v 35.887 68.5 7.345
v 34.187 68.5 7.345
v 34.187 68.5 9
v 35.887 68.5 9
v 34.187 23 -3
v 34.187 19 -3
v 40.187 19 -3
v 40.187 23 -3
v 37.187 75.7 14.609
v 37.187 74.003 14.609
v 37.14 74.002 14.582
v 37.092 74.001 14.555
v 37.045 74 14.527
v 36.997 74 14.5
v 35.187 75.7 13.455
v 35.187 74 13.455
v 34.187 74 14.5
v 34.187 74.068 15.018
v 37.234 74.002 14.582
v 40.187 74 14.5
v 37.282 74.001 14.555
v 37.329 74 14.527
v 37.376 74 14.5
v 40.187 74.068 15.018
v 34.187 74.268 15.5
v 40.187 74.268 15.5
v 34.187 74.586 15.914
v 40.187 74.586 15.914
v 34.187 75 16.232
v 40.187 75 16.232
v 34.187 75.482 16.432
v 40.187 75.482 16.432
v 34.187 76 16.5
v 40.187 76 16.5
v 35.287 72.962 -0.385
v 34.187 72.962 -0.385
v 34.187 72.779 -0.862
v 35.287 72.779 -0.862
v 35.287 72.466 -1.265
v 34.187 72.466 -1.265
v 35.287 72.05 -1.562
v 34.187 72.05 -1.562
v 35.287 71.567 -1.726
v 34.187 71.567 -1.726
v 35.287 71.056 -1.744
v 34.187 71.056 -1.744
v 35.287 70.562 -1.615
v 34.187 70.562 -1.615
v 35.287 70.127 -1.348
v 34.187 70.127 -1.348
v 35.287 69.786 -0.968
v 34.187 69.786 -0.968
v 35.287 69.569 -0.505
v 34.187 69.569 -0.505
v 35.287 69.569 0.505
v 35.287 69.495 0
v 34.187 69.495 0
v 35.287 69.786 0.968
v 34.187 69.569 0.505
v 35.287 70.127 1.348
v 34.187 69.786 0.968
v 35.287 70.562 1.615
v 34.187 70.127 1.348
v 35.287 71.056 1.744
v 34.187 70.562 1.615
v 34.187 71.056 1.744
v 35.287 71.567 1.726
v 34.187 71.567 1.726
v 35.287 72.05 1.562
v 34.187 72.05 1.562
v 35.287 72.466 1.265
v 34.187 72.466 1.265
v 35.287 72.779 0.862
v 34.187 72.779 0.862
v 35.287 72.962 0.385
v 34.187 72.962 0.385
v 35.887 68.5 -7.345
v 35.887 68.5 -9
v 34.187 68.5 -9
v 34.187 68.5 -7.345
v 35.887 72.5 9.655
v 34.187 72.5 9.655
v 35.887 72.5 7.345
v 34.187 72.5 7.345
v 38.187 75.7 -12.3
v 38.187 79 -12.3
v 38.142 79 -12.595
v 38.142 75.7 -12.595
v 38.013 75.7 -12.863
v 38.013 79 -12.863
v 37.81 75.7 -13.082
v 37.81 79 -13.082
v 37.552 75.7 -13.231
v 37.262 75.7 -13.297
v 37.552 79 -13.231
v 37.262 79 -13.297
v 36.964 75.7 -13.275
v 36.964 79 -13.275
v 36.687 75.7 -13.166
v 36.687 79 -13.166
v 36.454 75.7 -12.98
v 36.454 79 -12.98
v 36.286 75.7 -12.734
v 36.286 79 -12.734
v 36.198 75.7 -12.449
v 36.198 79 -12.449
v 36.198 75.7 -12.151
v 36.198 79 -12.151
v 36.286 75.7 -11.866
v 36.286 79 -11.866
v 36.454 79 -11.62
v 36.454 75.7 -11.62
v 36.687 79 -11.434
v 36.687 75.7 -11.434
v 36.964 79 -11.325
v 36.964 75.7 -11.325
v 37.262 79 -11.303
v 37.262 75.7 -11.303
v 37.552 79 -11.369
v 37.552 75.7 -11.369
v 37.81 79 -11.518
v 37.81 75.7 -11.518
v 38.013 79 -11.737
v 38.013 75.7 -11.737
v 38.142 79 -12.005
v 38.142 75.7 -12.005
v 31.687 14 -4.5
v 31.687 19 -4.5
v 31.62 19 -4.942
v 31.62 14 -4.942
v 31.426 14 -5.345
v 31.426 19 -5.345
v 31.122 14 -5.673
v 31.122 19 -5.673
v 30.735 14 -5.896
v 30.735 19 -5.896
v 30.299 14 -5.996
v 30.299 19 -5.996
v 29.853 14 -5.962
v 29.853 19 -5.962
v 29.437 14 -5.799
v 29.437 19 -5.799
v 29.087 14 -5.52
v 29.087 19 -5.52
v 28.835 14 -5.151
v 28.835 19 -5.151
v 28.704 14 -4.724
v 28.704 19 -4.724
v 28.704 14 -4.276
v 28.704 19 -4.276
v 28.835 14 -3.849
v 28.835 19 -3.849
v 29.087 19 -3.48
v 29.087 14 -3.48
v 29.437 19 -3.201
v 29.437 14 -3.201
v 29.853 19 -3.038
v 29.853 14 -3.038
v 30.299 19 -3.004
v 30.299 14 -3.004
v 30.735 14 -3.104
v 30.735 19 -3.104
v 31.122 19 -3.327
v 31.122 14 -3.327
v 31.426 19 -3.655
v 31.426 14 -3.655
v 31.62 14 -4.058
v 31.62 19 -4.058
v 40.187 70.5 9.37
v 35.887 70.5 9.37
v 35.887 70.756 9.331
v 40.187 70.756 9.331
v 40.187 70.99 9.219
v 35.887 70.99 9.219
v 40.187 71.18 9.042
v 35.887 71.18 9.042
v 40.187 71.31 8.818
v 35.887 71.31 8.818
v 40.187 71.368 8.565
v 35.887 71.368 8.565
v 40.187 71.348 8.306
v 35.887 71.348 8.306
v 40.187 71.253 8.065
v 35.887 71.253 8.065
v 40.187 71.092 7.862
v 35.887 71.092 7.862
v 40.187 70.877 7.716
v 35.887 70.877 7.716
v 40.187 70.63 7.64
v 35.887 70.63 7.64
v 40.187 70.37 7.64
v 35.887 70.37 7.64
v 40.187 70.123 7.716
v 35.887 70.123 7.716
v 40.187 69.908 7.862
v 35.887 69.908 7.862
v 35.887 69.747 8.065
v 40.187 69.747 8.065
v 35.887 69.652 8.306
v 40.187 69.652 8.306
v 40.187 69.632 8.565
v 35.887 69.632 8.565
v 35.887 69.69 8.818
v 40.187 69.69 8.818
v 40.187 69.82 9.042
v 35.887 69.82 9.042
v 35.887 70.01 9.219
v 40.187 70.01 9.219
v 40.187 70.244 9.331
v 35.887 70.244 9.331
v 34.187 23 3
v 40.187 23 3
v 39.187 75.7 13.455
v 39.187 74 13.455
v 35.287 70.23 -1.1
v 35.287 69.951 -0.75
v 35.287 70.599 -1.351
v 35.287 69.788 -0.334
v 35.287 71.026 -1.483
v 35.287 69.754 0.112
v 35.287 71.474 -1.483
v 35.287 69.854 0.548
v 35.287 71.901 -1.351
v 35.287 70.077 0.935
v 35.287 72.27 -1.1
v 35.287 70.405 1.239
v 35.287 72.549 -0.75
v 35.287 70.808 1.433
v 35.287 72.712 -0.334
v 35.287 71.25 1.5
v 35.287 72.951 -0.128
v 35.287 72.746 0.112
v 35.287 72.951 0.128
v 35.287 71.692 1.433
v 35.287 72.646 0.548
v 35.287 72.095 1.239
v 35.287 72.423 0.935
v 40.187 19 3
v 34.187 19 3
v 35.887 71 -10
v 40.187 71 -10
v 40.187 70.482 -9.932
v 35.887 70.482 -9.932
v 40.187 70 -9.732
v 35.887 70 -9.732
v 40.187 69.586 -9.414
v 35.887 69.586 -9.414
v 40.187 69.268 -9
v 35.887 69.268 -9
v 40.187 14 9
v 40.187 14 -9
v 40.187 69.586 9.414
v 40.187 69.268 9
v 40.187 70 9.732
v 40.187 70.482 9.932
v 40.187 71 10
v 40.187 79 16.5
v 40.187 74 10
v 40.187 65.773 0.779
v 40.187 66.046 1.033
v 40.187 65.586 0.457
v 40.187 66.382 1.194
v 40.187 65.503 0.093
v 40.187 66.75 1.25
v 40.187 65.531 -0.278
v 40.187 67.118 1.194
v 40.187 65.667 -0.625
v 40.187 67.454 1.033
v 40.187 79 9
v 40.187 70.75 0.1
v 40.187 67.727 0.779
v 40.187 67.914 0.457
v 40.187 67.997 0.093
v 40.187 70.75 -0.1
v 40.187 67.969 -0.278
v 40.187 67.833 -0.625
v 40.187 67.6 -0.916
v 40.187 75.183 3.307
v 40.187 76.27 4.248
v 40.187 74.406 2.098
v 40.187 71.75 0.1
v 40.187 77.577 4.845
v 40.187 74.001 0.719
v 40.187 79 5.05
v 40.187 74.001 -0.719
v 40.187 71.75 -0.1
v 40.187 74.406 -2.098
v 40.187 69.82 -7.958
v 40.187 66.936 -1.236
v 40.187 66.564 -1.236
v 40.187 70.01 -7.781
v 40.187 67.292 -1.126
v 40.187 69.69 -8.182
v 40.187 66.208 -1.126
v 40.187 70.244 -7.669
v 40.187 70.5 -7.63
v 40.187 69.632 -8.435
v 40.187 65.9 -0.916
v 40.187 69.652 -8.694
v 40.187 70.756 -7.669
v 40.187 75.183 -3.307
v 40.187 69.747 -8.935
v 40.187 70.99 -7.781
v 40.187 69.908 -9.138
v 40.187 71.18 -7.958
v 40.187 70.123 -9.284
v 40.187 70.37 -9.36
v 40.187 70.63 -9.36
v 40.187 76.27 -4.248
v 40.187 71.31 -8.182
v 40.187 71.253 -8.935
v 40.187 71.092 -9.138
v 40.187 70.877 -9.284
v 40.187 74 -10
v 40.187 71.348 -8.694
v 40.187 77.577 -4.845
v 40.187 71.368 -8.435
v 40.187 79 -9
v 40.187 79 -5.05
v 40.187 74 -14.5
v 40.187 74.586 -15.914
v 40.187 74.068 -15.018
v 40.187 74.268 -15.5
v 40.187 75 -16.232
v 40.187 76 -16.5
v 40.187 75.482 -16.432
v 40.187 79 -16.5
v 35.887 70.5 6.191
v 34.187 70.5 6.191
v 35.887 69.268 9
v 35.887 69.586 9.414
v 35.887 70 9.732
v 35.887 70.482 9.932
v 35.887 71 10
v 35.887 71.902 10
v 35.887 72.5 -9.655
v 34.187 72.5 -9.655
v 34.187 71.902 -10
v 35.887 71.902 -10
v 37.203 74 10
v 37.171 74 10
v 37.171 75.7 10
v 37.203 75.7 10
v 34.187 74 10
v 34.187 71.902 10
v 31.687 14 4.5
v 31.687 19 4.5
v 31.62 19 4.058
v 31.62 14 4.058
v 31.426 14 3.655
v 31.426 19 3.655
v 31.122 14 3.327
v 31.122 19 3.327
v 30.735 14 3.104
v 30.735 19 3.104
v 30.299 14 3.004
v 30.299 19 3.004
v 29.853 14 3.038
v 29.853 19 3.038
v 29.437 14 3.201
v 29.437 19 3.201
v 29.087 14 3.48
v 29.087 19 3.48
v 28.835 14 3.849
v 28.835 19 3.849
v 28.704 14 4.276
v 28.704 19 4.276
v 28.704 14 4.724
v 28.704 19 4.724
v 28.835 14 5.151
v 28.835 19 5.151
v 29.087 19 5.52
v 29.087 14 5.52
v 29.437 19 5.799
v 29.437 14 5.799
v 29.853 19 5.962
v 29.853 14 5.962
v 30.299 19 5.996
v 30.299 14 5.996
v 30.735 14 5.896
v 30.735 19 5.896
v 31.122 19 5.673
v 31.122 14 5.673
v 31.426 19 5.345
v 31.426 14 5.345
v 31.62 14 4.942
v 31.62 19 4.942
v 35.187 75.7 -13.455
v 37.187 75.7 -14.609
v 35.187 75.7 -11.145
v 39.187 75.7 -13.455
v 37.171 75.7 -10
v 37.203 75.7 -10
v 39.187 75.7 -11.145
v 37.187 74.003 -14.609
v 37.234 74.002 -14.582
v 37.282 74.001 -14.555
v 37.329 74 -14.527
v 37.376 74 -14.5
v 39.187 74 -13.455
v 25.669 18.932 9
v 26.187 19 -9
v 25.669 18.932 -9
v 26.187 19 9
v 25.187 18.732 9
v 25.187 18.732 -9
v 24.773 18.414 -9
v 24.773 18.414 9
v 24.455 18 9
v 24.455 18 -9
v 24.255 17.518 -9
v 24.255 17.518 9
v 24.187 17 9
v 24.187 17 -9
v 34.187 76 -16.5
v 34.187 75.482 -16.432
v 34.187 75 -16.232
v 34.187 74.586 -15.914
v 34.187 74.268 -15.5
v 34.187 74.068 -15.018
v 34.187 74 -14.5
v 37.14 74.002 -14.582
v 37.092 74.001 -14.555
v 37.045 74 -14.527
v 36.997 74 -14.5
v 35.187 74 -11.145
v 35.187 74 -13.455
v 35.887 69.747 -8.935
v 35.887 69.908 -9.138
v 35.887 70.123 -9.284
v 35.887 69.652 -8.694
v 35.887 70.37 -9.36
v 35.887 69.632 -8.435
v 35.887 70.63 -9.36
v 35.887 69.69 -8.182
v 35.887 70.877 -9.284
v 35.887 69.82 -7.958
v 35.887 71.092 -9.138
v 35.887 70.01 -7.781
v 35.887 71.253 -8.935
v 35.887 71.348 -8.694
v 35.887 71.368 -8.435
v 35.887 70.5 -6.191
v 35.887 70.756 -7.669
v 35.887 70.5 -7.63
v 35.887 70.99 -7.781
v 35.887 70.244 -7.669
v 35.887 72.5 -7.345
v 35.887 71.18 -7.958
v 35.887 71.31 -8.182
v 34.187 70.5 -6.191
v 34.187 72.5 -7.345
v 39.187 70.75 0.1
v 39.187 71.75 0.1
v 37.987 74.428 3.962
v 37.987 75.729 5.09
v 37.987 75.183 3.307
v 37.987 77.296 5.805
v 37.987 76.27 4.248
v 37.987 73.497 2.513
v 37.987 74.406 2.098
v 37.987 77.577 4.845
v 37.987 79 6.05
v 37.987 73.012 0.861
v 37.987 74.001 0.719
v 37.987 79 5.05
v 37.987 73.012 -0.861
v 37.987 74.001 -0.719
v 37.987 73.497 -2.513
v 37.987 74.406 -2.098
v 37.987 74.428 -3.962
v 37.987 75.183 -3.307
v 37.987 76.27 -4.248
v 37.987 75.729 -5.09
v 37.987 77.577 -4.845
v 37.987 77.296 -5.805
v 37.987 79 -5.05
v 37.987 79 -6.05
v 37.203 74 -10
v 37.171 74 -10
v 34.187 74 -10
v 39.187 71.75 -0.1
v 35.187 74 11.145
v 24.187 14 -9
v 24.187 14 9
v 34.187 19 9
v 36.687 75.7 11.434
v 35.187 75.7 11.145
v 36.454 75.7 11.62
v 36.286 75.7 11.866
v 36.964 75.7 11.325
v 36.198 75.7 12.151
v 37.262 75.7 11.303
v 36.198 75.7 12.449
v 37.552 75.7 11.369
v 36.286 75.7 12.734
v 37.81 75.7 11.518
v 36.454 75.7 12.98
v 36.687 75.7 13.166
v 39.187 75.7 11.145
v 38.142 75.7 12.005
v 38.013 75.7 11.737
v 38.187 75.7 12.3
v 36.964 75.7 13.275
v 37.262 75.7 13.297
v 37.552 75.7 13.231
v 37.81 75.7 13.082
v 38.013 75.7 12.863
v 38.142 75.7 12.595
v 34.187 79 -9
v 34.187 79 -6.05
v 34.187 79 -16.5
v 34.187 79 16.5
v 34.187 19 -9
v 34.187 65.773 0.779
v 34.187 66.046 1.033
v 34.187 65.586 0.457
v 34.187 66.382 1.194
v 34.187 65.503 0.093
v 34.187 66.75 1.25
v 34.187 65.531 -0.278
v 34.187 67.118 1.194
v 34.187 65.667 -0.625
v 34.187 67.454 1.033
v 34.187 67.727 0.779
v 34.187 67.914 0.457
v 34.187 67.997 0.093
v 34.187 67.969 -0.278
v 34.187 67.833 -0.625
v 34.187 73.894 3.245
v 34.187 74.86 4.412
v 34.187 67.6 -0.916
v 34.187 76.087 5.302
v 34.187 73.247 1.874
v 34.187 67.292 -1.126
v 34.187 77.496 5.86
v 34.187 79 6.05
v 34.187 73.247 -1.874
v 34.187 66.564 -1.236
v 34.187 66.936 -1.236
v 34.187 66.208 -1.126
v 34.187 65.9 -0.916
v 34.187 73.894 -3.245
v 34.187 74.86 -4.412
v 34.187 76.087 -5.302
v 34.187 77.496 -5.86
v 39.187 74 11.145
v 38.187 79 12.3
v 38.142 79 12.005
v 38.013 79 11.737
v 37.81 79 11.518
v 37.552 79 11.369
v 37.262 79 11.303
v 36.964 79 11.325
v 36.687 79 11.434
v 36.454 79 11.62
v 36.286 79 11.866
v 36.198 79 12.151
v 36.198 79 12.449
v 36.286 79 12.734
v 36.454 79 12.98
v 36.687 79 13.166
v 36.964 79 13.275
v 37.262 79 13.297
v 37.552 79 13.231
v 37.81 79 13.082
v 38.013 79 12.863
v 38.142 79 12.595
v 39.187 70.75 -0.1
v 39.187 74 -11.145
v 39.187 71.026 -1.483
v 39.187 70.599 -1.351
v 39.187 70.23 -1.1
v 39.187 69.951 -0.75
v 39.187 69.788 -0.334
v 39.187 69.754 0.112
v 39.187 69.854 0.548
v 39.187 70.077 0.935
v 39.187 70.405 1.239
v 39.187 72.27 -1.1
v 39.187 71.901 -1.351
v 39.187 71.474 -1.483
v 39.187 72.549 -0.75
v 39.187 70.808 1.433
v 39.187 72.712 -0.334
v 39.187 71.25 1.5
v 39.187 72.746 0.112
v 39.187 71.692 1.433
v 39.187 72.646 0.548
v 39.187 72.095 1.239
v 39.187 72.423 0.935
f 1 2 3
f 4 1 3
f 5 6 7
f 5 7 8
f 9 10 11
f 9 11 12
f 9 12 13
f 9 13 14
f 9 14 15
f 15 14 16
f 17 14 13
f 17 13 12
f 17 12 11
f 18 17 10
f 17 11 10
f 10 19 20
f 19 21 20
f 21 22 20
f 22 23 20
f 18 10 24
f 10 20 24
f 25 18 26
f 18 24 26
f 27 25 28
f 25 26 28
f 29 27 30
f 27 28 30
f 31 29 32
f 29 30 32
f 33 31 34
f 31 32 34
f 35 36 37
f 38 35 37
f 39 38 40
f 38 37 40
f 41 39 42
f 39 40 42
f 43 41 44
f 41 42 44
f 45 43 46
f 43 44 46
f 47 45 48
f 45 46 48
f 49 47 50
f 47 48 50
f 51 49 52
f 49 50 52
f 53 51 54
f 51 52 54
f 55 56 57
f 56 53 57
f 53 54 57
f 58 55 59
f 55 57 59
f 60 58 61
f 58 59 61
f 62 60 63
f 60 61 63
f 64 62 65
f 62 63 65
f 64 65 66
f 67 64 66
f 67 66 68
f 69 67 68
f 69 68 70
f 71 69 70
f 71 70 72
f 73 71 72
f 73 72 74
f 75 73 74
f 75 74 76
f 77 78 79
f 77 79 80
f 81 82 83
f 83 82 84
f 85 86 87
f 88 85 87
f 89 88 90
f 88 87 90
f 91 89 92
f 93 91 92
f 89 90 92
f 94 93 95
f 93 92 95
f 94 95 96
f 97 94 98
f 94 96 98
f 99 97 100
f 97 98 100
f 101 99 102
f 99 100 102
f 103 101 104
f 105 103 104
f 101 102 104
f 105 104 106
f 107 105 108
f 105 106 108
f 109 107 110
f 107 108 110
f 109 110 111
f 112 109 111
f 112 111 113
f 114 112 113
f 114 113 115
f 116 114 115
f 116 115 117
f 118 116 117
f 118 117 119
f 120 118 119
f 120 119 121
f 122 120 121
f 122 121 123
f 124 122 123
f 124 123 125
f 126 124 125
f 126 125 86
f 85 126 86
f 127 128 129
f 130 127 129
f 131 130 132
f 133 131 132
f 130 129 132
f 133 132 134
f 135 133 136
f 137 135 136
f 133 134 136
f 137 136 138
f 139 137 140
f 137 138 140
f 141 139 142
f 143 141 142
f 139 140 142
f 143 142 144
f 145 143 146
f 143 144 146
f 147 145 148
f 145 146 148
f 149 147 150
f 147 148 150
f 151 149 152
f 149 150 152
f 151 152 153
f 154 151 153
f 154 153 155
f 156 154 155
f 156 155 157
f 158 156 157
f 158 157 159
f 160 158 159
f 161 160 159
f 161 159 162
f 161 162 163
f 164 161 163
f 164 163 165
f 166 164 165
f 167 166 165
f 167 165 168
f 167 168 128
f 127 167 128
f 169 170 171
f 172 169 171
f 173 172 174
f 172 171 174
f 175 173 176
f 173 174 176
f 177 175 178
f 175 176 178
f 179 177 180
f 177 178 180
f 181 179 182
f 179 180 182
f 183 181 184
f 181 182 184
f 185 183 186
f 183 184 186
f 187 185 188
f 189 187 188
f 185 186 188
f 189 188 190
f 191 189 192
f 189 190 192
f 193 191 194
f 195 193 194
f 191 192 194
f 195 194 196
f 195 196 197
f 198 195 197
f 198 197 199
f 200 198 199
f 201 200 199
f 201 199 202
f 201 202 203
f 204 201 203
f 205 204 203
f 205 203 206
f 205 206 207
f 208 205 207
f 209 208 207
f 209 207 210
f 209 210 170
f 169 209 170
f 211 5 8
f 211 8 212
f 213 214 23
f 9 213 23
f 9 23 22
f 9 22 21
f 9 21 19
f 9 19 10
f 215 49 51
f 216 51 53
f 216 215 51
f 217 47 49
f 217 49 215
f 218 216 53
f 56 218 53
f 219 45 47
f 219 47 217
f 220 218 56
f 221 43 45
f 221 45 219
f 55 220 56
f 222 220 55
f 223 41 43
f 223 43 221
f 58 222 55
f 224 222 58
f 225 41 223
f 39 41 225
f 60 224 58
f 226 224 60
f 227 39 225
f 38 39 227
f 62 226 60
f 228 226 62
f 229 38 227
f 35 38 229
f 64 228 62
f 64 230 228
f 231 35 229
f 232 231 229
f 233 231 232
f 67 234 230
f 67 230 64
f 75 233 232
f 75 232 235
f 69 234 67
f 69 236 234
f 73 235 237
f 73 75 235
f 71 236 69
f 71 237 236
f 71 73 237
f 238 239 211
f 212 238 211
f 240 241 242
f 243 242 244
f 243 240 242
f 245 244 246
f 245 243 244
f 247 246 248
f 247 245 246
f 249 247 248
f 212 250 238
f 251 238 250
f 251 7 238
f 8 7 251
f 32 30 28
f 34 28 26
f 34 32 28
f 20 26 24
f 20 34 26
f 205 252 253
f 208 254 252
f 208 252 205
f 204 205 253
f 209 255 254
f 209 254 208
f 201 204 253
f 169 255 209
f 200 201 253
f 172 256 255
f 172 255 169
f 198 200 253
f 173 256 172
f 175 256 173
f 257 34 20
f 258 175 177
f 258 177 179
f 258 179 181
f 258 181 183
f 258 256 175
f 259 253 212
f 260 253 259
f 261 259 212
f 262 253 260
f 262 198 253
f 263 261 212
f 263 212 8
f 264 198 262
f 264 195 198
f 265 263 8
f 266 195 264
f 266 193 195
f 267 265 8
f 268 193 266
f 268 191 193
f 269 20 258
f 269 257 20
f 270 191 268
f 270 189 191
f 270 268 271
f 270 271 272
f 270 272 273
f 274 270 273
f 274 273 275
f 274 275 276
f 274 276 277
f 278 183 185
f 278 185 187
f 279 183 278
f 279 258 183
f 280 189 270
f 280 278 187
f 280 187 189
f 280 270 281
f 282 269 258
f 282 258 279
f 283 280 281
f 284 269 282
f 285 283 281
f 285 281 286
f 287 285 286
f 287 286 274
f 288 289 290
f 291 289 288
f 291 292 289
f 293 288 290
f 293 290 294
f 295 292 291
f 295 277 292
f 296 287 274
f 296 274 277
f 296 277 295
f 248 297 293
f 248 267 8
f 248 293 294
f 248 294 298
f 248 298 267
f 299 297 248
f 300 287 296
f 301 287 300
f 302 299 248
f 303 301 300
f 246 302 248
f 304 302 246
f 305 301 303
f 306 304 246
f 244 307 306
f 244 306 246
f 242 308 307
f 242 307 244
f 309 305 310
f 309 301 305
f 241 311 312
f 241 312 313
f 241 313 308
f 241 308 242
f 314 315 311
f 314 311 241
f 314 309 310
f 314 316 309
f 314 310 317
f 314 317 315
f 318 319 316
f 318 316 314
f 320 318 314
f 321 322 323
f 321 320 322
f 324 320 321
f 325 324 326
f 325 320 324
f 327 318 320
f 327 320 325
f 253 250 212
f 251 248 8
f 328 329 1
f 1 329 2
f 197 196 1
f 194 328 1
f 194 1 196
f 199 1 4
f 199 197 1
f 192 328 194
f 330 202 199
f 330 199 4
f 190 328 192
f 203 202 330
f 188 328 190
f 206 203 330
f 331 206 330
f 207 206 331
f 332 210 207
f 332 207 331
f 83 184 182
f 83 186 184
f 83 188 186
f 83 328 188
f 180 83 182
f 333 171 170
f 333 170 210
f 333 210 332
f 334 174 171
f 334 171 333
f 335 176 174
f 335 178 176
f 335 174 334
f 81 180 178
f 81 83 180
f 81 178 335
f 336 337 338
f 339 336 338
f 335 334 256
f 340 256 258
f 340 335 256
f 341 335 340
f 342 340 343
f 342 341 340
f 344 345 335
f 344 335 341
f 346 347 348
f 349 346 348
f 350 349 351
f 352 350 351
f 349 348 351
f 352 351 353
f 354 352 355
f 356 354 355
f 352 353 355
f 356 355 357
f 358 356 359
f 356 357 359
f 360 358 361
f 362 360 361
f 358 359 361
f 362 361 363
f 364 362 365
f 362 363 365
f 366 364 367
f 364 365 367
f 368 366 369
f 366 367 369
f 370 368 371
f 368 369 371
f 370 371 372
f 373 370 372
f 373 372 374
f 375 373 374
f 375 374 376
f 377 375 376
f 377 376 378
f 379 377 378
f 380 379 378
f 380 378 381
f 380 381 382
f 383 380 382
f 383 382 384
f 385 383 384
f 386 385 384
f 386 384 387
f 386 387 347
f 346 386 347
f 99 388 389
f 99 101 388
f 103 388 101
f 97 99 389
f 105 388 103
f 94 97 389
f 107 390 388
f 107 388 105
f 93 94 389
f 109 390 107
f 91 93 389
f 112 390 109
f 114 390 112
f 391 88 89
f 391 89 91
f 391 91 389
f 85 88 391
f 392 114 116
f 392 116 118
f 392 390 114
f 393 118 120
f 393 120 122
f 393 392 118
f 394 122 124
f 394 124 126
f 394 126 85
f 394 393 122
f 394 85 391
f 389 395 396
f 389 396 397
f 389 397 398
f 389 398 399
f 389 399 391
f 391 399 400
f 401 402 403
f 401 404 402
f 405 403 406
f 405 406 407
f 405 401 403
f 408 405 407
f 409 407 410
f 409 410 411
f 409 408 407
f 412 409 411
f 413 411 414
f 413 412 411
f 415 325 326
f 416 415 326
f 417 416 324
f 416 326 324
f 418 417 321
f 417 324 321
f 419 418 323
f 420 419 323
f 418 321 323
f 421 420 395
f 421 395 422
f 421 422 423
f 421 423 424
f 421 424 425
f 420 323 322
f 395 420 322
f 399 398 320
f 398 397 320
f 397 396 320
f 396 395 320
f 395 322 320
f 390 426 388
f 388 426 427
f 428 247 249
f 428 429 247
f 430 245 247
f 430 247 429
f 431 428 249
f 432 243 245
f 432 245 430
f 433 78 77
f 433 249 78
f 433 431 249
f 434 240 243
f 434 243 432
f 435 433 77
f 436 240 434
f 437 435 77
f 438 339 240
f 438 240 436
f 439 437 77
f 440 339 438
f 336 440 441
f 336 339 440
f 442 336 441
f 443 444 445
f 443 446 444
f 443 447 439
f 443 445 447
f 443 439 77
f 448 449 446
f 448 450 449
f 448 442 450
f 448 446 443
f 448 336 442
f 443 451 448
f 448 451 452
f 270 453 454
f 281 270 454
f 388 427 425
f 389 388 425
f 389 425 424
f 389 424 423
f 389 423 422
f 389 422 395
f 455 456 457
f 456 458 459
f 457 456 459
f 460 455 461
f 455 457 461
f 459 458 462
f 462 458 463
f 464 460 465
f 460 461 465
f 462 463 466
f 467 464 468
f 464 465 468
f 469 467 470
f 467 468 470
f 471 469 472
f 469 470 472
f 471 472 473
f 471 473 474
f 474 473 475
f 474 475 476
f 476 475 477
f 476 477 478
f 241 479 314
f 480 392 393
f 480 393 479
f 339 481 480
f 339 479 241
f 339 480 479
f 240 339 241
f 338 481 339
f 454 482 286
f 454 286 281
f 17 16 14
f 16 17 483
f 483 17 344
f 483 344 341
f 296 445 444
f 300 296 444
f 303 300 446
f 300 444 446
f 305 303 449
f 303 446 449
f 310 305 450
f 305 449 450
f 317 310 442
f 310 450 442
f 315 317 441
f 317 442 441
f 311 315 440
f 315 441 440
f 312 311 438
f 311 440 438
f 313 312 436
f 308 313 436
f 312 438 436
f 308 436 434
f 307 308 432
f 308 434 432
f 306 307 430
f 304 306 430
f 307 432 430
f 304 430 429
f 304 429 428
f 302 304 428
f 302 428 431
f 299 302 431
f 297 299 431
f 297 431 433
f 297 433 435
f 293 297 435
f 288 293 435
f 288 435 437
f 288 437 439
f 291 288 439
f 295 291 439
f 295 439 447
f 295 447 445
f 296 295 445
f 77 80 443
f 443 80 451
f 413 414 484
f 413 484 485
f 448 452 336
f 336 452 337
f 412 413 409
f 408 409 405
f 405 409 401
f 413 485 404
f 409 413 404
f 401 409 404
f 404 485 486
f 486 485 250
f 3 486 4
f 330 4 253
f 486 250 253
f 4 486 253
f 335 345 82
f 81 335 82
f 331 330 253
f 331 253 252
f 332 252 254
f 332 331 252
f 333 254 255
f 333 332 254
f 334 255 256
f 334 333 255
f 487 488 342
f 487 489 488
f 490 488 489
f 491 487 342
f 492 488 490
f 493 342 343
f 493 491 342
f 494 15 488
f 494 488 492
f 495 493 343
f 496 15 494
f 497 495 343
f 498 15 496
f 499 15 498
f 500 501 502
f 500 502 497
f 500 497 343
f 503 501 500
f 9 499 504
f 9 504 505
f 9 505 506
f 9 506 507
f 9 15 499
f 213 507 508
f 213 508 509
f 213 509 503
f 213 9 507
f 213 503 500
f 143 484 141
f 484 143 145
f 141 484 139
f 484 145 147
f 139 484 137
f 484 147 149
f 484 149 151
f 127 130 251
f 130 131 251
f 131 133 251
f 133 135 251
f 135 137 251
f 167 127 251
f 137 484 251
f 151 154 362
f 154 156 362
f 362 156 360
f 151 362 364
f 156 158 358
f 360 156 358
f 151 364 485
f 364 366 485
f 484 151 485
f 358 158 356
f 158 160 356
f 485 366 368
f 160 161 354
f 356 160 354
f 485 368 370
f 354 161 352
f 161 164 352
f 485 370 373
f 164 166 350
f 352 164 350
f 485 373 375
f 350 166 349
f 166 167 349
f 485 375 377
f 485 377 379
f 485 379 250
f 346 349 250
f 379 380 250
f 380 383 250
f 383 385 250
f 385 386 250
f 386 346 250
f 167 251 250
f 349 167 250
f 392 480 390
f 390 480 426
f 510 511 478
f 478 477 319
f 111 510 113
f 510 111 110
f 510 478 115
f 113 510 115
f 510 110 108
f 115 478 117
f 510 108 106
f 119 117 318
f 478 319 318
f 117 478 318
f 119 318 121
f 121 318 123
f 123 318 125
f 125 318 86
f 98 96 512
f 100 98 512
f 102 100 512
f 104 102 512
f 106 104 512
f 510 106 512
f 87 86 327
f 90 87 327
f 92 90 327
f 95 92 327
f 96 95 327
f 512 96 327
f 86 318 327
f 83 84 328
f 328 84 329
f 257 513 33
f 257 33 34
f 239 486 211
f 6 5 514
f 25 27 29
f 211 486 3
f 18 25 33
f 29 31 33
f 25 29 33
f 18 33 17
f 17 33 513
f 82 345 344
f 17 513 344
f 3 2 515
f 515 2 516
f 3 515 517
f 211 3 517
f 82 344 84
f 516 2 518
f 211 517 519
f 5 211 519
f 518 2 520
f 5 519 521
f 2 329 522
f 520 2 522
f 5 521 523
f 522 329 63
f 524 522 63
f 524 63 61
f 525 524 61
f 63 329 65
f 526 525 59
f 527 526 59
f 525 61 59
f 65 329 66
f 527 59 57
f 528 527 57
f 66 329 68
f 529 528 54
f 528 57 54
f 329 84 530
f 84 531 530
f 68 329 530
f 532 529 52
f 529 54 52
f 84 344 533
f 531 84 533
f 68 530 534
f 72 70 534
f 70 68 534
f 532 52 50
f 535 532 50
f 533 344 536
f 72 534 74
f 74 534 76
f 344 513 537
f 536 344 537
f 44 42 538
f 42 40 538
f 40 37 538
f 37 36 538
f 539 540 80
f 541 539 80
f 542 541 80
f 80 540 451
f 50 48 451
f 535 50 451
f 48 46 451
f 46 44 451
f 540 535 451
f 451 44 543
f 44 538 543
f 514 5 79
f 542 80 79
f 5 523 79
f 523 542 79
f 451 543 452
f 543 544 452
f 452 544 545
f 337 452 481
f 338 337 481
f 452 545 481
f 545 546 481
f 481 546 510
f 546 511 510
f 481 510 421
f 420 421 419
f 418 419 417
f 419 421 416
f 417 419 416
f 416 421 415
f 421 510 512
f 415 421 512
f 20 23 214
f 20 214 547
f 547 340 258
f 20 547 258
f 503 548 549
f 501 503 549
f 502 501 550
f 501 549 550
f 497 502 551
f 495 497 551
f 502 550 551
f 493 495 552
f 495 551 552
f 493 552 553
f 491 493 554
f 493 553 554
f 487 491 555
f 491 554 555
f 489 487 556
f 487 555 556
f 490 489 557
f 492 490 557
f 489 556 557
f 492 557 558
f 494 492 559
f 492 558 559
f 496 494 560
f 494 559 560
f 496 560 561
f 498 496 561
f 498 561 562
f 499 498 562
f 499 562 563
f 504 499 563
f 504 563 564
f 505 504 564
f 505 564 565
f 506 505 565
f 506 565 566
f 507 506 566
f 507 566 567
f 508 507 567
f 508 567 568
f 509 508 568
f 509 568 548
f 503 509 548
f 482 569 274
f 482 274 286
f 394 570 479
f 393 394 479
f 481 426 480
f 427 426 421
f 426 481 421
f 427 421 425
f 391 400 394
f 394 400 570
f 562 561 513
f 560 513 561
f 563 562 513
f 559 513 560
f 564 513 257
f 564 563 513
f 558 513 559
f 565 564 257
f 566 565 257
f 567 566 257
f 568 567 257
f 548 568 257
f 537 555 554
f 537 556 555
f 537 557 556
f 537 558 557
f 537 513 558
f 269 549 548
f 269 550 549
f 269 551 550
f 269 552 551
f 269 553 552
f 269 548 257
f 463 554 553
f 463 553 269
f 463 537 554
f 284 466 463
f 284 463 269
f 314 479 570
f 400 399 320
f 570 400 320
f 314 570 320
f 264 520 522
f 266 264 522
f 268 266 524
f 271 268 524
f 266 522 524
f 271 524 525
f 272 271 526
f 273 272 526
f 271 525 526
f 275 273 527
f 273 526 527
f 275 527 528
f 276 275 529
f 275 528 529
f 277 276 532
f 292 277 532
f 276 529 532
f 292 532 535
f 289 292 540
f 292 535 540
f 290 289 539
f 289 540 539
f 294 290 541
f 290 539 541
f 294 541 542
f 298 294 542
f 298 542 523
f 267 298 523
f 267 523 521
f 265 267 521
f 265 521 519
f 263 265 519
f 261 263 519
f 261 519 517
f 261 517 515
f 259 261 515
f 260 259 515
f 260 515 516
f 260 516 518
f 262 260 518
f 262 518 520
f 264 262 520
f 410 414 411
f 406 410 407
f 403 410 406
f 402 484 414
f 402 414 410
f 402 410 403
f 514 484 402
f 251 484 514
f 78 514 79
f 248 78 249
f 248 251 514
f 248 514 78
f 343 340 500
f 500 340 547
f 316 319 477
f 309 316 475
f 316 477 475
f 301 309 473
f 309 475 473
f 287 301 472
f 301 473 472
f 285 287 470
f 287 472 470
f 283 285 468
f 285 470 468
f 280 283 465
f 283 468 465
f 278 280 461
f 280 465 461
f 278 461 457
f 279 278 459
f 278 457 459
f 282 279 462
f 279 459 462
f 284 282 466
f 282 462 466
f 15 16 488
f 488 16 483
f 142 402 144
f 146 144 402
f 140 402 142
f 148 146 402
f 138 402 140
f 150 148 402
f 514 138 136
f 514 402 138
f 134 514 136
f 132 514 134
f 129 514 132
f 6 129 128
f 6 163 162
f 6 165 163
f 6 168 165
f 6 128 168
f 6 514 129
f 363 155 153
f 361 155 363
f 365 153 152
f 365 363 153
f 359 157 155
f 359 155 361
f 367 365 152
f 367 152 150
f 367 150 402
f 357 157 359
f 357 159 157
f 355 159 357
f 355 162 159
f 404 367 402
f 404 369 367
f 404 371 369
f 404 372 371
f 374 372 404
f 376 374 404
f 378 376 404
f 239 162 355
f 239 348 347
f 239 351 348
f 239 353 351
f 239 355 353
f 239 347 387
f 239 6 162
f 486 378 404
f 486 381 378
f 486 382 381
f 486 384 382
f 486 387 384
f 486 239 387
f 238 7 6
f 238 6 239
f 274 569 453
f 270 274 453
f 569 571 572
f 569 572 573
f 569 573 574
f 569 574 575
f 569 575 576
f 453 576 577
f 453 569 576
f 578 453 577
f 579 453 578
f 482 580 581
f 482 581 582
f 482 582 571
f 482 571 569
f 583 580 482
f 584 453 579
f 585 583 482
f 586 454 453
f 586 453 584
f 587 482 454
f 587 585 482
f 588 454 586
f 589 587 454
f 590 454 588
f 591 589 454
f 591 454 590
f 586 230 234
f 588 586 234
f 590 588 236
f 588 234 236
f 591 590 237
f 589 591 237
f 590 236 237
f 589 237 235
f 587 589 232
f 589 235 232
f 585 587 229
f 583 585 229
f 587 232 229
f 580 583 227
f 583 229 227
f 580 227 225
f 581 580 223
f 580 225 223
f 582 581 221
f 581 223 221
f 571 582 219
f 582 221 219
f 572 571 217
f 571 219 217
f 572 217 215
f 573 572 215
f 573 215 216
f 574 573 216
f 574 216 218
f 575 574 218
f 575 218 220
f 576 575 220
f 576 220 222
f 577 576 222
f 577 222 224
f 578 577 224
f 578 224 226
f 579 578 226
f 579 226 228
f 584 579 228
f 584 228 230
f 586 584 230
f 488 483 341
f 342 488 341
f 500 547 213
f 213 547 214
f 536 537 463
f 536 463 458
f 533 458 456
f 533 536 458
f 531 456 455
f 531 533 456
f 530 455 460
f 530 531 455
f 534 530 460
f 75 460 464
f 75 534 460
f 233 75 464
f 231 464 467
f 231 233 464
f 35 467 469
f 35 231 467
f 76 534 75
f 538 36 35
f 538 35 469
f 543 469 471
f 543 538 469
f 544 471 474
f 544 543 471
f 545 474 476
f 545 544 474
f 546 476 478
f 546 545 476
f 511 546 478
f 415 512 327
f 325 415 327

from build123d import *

# Parameters (mm, degrees)
SKETCH1_R                 = 17.45
SKETCH1_R_2               = 12.45
BOSS_EXTRUDE1_DEPTH       = 8
SKETCH2_R                 = 20
SKETCH2_R_2               = 12.45
BOSS_EXTRUDE2_DEPTH       = 2
SKETCH3_R                 = 32.5
SKETCH3_R_2               = 12.45
BOSS_EXTRUDE3_DEPTH       = 4
FILLET1_R                 = 1
BOSS_EXTRUDE6_START       = -4
SKETCH10_W                = 10
SKETCH10_H                = 18
BOSS_EXTRUDE6_DEPTH       = 4
SKETCH4_W                 = 6
SKETCH4_H                 = 18
BOSS_EXTRUDE4_DEPTH       = 75
BOSS_EXTRUDE4_DEPTH_BACK  = 4
SKETCH5_R                 = 5.05
CUT_EXTRUDE1_DEPTH        = 306
CUT_EXTRUDE1_DEPTH_BACK   = 113
SKETCH6_W                 = 6
SKETCH6_H                 = 10
BOSS_EXTRUDE5_DEPTH       = 15
BOSS_EXTRUDE5_DEPTH_BACK  = 32.85
SKETCH7_R                 = 1.629220746
SKETCH7_R_2               = 1.580258945
CUT_EXTRUDE2_DEPTH        = 10
SKETCH9_R                 = 5.05
CUT_EXTRUDE3_DEPTH        = 10
CUT_EXTRUDE3_DEPTH_BACK   = 10
SKETCH11_W                = 9.782596874
SKETCH11_H                = 3.234517514
CUT_EXTRUDE4_DEPTH        = 123
CUT_EXTRUDE4_DEPTH_BACK   = 61
FILLET4_R                 = 3
FILLET5_R                 = 3
SKETCH12_W                = 108.791398151
SKETCH12_H                = 24.041848298
CUT_EXTRUDE5_DEPTH        = 110.678
SKETCH15_R                = 22
CUT_EXTRUDE7_DEPTH        = 4
SKETCH13_R                = 22
SKETCH13_R_2              = 11
SKETCH13_R_3              = 2.75
BOSS_EXTRUDE7_DEPTH       = 4
FILLET6_R                 = 3
CUT_EXTRUDE8_DEPTH        = 5
FILLET7_R                 = 1
BOSS_EXTRUDE8_START       = -3
BOSS_EXTRUDE8_DEPTH       = 9.4
FILLET8_R                 = 3
FILLET8_OF_MIRROR2_R      = 3
CUT_EXTRUDE12_START       = -6
SKETCH21_R                = 6.05
CUT_EXTRUDE12_DEPTH       = 3.8
SKETCH18_W                = 88.746975794
SKETCH18_H                = 20.386854219
CUT_EXTRUDE9_DEPTH        = 10
SKETCH19_W                = 6
SKETCH19_H                = 10.45
BOSS_EXTRUDE9_DEPTH       = 5
FILLET9_R                 = 2
CUT_EXTRUDE13_DEPTH       = 2
SKETCH23_R                = 1
CUT_EXTRUDE14_DEPTH       = 11
CUT_EXTRUDE16_DEPTH       = 1.7
CUT_EXTRUDE17_DEPTH       = 55
CUT_EXTRUDE17_DEPTH_BACK  = 127
SKETCH26_W                = 18
SKETCH26_H                = 5
BOSS_EXTRUDE10_DEPTH      = 10
BOSS_EXTRUDE10_DEPTH_BACK = 6
FILLET10_R                = 2
SKETCH27_W                = 6
SKETCH27_H                = 4
CUT_EXTRUDE18_DEPTH       = 10
SKETCH28_R                = 1.5
CUT_EXTRUDE19_DEPTH       = 10
BOSS_EXTRUDE11_DEPTH      = 6
SKETCH30_R                = 0.870021032
CUT_EXTRUDE20_DEPTH       = 6
CUT_EXTRUDE21_DEPTH       = 1.7
SKETCH32_R                = 1.5
CUT_EXTRUDE22_DEPTH       = 5
SKETCH33_W                = 0.2
SKETCH33_H                = 1
CUT_EXTRUDE23_DEPTH       = 5
SKETCH34_R                = 1.755
CUT_EXTRUDE24_DEPTH       = 1.1
SKETCH35_R                = 1.25
CUT_EXTRUDE25_DEPTH       = 11.1


with BuildPart() as part:
    # Sketch1 → Boss-Extrude1 (new body)
    with BuildSketch(Plane(origin=(0, 0, 0), x_dir=(1, 0, 0), z_dir=(0, 1, 0))):
        Circle(SKETCH1_R)
        Circle(SKETCH1_R_2, mode=Mode.SUBTRACT)
    extrude(amount=BOSS_EXTRUDE1_DEPTH)

    # Sketch2 → Boss-Extrude2 (add)
    with BuildSketch(Plane(origin=(0, 8, 0), x_dir=(1, 0, 0), z_dir=(0, 1, 0))):
        Circle(SKETCH2_R)
        Circle(SKETCH2_R_2, mode=Mode.SUBTRACT)
    extrude(amount=BOSS_EXTRUDE2_DEPTH)

    # Sketch3 → Boss-Extrude3 (add)
    with BuildSketch(Plane(origin=(0, 10, 0), x_dir=(1, 0, 0), z_dir=(0, 1, 0))):
        Circle(SKETCH3_R)
        Circle(SKETCH3_R_2, mode=Mode.SUBTRACT)
    extrude(amount=BOSS_EXTRUDE3_DEPTH)

    # Fillet1
    fillet1_edges = [part.edges().sort_by_distance(p)[0] for p in [
        (-32.5, 14, 0),
    ]]
    fillet(fillet1_edges, radius=FILLET1_R)

    # Sketch10 → Boss-Extrude6 (add)
    with BuildSketch(Plane(origin=(0, 14, 0), x_dir=(1, 0, 0), z_dir=(0, 1, 0)).offset(BOSS_EXTRUDE6_START)):
        with Locations((35.186917696, 0)):
            Rectangle(SKETCH10_W, SKETCH10_H)
        with Locations((-35.186917696, 0)):
            Rectangle(SKETCH10_W, SKETCH10_H)
    extrude(amount=BOSS_EXTRUDE6_DEPTH)

    # Sketch4 → Boss-Extrude4 (add, two sides)
    with BuildSketch(Plane(origin=(0, 14, 0), x_dir=(1, 0, 0), z_dir=(0, 1, 0))) as boss_extrude4_sk:
        with Locations((-37.186917696, 0)):
            Rectangle(SKETCH4_W, SKETCH4_H)
        with Locations((37.186917696, 0)):
            Rectangle(SKETCH4_W, SKETCH4_H)
    extrude(amount=BOSS_EXTRUDE4_DEPTH)
    extrude(boss_extrude4_sk.sketch, amount=-BOSS_EXTRUDE4_DEPTH_BACK)

    # Sketch5 → Cut-Extrude1 (cut, two sides)
    with BuildSketch(Plane.ZY.offset(-34.186917696)) as cut_extrude1_sk:
        with Locations((0, 79)):
            Circle(SKETCH5_R)
    extrude(amount=CUT_EXTRUDE1_DEPTH, mode=Mode.SUBTRACT)
    extrude(cut_extrude1_sk.sketch, amount=-CUT_EXTRUDE1_DEPTH_BACK, mode=Mode.SUBTRACT)

    # Sketch6 → Boss-Extrude5 (add, two sides)
    with BuildSketch(Plane(origin=(0, 0, -9), x_dir=(-1, 0, 0), z_dir=(0, 0, -1))) as boss_extrude5_sk:
        with Locations((37.186917696, 70.95)):
            Rectangle(SKETCH6_W, SKETCH6_H)
    extrude(amount=BOSS_EXTRUDE5_DEPTH)
    extrude(boss_extrude5_sk.sketch, amount=-BOSS_EXTRUDE5_DEPTH_BACK)

    # Sketch7 → Cut-Extrude2 (cut)
    with BuildSketch(Plane(origin=(-34.186917696, 0, 0), x_dir=(0, 0, -1), z_dir=(1, 0, 0))):
        with Locations((-17.5, 71)):
            Circle(SKETCH7_R)
        with Locations((17.5, 71)):
            Circle(SKETCH7_R_2)
    extrude(amount=-CUT_EXTRUDE2_DEPTH, mode=Mode.SUBTRACT)

    # Sketch9 → Cut-Extrude3 (cut, two sides)
    with BuildSketch(Plane(origin=(-34.186917696, 0, 0), x_dir=(0, 0, -1), z_dir=(1, 0, 0))) as cut_extrude3_sk:
        with Locations((0, 79)):
            Circle(SKETCH9_R)
    extrude(amount=CUT_EXTRUDE3_DEPTH, mode=Mode.SUBTRACT)
    extrude(cut_extrude3_sk.sketch, amount=-CUT_EXTRUDE3_DEPTH_BACK, mode=Mode.SUBTRACT)

    # Sketch11 → Cut-Extrude4 (cut, two sides)
    with BuildSketch(Plane.ZY.offset(-34.186917696)) as cut_extrude4_sk:
        with Locations((0, 15.617258757)):
            Rectangle(SKETCH11_W, SKETCH11_H)
    extrude(amount=CUT_EXTRUDE4_DEPTH, mode=Mode.SUBTRACT)
    extrude(cut_extrude4_sk.sketch, amount=-CUT_EXTRUDE4_DEPTH_BACK, mode=Mode.SUBTRACT)

    # Fillet4
    fillet4_edges = [part.edges().sort_by_distance(p)[0] for p in [
        (-37.186917696, 65.95, 23.85),
        (-37.186917696, 75.95, 23.85),
        (-37.186917696, 65.95, -24),
        (-37.186917696, 75.95, -24),
        (-37.186917696, 89, -9),
        (-37.186917696, 89, 9),
    ]]
    fillet(fillet4_edges, radius=FILLET4_R)

    # Fillet5
    fillet5_edges = [part.edges().sort_by_distance(p)[0] for p in [
        (40.186917696, 10, 0),
        (-40.186917696, 10, 0),
    ]]
    fillet(fillet5_edges, radius=FILLET5_R)

    # Sketch12 → Cut-Extrude5 (cut)
    with BuildSketch(Plane(origin=(40.186917696, 0, 0), x_dir=(0, 0, -1), z_dir=(1, 0, 0))):
        with Locations((-12.502918017, -2.020924149)):
            Rectangle(SKETCH12_W, SKETCH12_H)
    extrude(amount=-CUT_EXTRUDE5_DEPTH, mode=Mode.SUBTRACT)

    # Sketch15 → Cut-Extrude7 (cut)
    with BuildSketch(Plane(origin=(0, 14, 0), x_dir=(1, 0, 0), z_dir=(0, 1, 0))):
        Circle(SKETCH15_R)
    extrude(amount=-CUT_EXTRUDE7_DEPTH, mode=Mode.SUBTRACT)

    # Sketch13 → Boss-Extrude7 (add)
    with BuildSketch(Plane(origin=(0, 14, 0), x_dir=(1, 0, 0), z_dir=(0, 1, 0))):
        Circle(SKETCH13_R)
        Circle(SKETCH13_R_2, mode=Mode.SUBTRACT)
        with Locations((0, 17.5)):
            Circle(SKETCH13_R_3, mode=Mode.SUBTRACT)
        with Locations((-15.155444566, -8.75)):
            Circle(SKETCH13_R_3, mode=Mode.SUBTRACT)
        with Locations((15.155444566, -8.75)):
            Circle(SKETCH13_R_3, mode=Mode.SUBTRACT)
    extrude(amount=-BOSS_EXTRUDE7_DEPTH)

    # Fillet6
    fillet6_edges = [part.edges().sort_by_distance(p)[0] for p in [
        (37.186917696, 89, 9),
        (37.186917696, 89, -9),
    ]]
    fillet(fillet6_edges, radius=FILLET6_R)

    # Sketch16 → Cut-Extrude8 (cut)
    with BuildSketch(Plane.XZ.offset(-10)):
        with BuildLine():
            Line((-31.228992939, 9), (-20.29384143, 9))
            ThreePointArc((-20.29384143, 9), (0, 22.2), (20.29384143, 9))
            Line((20.29384143, 9), (31.228992939, 9))
            ThreePointArc((31.228992939, 9), (0, 32.5), (-31.228992939, 9))
        make_face()
    cut_extrude8 = extrude(amount=-CUT_EXTRUDE8_DEPTH, mode=Mode.SUBTRACT)

    # Mirror1: Cut-Extrude8 across plane
    add(cut_extrude8.mirror(Plane.XY), mode=Mode.SUBTRACT)

    # Fillet7
    fillet7_edges = [part.edges().sort_by_distance(p)[0] for p in [
        (0, 14, 22.2),
        (0, 14, -22.2),
    ]]
    fillet(fillet7_edges, radius=FILLET7_R)

    # Sketch17 → Boss-Extrude8 (add)
    with BuildSketch(Plane.XZ.offset(-10).offset(BOSS_EXTRUDE8_START)):
        with BuildLine():
            Line((20.29384143, -9), (40.186917696, -9))
            Line((40.186917696, -9), (40.186917696, 9))
            Line((40.186917696, 9), (20.29384143, 9))
            ThreePointArc((20.29384143, 9), (22.2, 0), (20.29384143, -9))
        make_face()
    boss_extrude8 = extrude(amount=BOSS_EXTRUDE8_DEPTH)

    # Fillet8
    fillet8_edges = [part.edges().sort_by_distance(p)[0] for p in [
        (40.186917696, 3.6, 0),
    ]]
    fillet(fillet8_edges, radius=FILLET8_R)

    # Mirror2: Boss-Extrude8 across plane
    add(boss_extrude8.mirror(Plane(origin=(0, 0, 0), x_dir=(0, 0, 1), z_dir=(1, 0, 0))))

    # Fillet8 of Mirror2
    fillet8_of_mirror2_edges = [part.edges().sort_by_distance(p)[0] for p in [
        (-40.186917696, 3.6, 0),
    ]]
    fillet(fillet8_of_mirror2_edges, radius=FILLET8_OF_MIRROR2_R)

    # Sketch21 → Cut-Extrude12 (cut)
    with BuildSketch(Plane(origin=(40.186917696, 0, 0), x_dir=(0, 0, -1), z_dir=(1, 0, 0)).offset(CUT_EXTRUDE12_START)):
        with Locations((0, 79)):
            Circle(SKETCH21_R)
    extrude(amount=CUT_EXTRUDE12_DEPTH, mode=Mode.SUBTRACT)

    # Sketch18 → Cut-Extrude9 (cut)
    with BuildSketch(Plane(origin=(40.186917696, 0, 0), x_dir=(0, 0, -1), z_dir=(1, 0, 0))):
        with Locations((0, 89.193427109)):
            Rectangle(SKETCH18_W, SKETCH18_H)
    extrude(amount=-CUT_EXTRUDE9_DEPTH, mode=Mode.SUBTRACT)

    # Sketch19 → Boss-Extrude9 (add)
    with BuildSketch(Plane(origin=(0, 79, 0), x_dir=(1, 0, 0), z_dir=(0, 1, 0))):
        with Locations((37.186917696, -11.275)):
            Rectangle(SKETCH19_W, SKETCH19_H)
        with Locations((37.186917696, 11.275)):
            Rectangle(SKETCH19_W, SKETCH19_H)
    extrude(amount=-BOSS_EXTRUDE9_DEPTH)

    # Fillet9
    fillet9_edges = [part.edges().sort_by_distance(p)[0] for p in [
        (37.186917696, 74, 16.5),
        (37.186917696, 74, -16.5),
    ]]
    fillet(fillet9_edges, radius=FILLET9_R)

    # Sketch22 → Cut-Extrude13 (cut)
    with BuildSketch(Plane(origin=(-34.186917696, 0, 0), x_dir=(0, 0, -1), z_dir=(1, 0, 0))):
        Polygon((-15.9988893, 68.4), (-14.4977786, 71), (-15.9988893, 73.6), (-19.0011107, 73.6), (-20.5022214, 71), (-19.0011107, 68.4), align=None)
        Polygon((20.5022214, 71), (19.0011107, 73.6), (15.9988893, 73.6), (14.4977786, 71), (15.9988893, 68.4), (19.0011107, 68.4), align=None)
    extrude(amount=-CUT_EXTRUDE13_DEPTH, mode=Mode.SUBTRACT)

    # Sketch23 → Cut-Extrude14 (cut)
    with BuildSketch(Plane(origin=(0, 79, 0), x_dir=(1, 0, 0), z_dir=(0, 1, 0))):
        with Locations((37.186917696, -12.3)):
            Circle(SKETCH23_R)
        with Locations((37.186917696, 12.3)):
            Circle(SKETCH23_R)
    extrude(amount=-CUT_EXTRUDE14_DEPTH, mode=Mode.SUBTRACT)

    # Sketch24 → Cut-Extrude16 (cut)
    with BuildSketch(Plane.XZ.offset(-74)):
        Polygon((37.186917696, 9.990598923), (39.186917696, 11.145299462), (39.186917696, 13.454700538), (37.186917696, 14.609401077), (35.186917696, 13.454700538), (35.186917696, 11.145299462), align=None)
        Polygon((37.186917696, -14.609401077), (39.186917696, -13.454700538), (39.186917696, -11.145299462), (37.186917696, -9.990598923), (35.186917696, -11.145299462), (35.186917696, -13.454700538), align=None)
    extrude(amount=-CUT_EXTRUDE16_DEPTH, mode=Mode.SUBTRACT)

    # Sketch25 → Cut-Extrude17 (cut, two sides)
    with BuildSketch(Plane.XY.offset(9)) as cut_extrude17_sk:
        Polygon((34.186917696, 121.100331415), (-54.647701705, 121.100331415), (-54.647701705, -34.206054819), (60.966679658, -34.206054819), (60.966679658, 14), (34.186917696, 14), align=None)
    extrude(amount=CUT_EXTRUDE17_DEPTH, mode=Mode.SUBTRACT)
    extrude(cut_extrude17_sk.sketch, amount=-CUT_EXTRUDE17_DEPTH_BACK, mode=Mode.SUBTRACT)

    # Sketch26 → Boss-Extrude10 (add, two sides)
    with BuildSketch(Plane.ZY.offset(-34.186917696)) as boss_extrude10_sk:
        with Locations((0, 16.5)):
            Rectangle(SKETCH26_W, SKETCH26_H)
    extrude(amount=BOSS_EXTRUDE10_DEPTH)
    extrude(boss_extrude10_sk.sketch, amount=-BOSS_EXTRUDE10_DEPTH_BACK)

    # Fillet10
    fillet10_edges = [part.edges().sort_by_distance(p)[0] for p in [
        (24.186917696, 19, 0),
    ]]
    fillet(fillet10_edges, radius=FILLET10_R)

    # Sketch27 → Cut-Extrude18 (cut)
    with BuildSketch(Plane.ZY.offset(-34.186917696)):
        with Locations((0, 21)):
            Rectangle(SKETCH27_W, SKETCH27_H)
    extrude(amount=-CUT_EXTRUDE18_DEPTH, mode=Mode.SUBTRACT)

    # Sketch28 → Cut-Extrude19 (cut)
    with BuildSketch(Plane(origin=(0, 19, 0), x_dir=(1, 0, 0), z_dir=(0, 1, 0))):
        with Locations((30.186917696, 4.5)):
            Circle(SKETCH28_R)
        with Locations((30.186917696, -4.5)):
            Circle(SKETCH28_R)
    extrude(amount=-CUT_EXTRUDE19_DEPTH, mode=Mode.SUBTRACT)

    # Sketch29 → Boss-Extrude11 (add)
    with BuildSketch(Plane.ZY.offset(-34.186917696)):
        with BuildLine():
            Line((-6.05, 79), (-10, 79))
            Line((-10, 79), (-10, 71))
            ThreePointArc((-10, 71), (-9.414213562, 69.585786438), (-8, 69))
            Line((-8, 69), (8, 69))
            ThreePointArc((8, 69), (9.414213562, 69.585786438), (10, 71))
            Line((10, 71), (10, 79))
            Line((10, 79), (6.05, 79))
            Line((6.05, 79), (6.05, 71.902838549))
            Line((6.05, 71.902838549), (-6.05, 71.902838549))
            Line((-6.05, 71.902838549), (-6.05, 79))
        make_face()
    extrude(amount=-BOSS_EXTRUDE11_DEPTH)

    # Sketch30 → Cut-Extrude20 (cut)
    with BuildSketch(Plane.ZY.offset(-34.186917696)):
        with Locations((-8.5, 70.5)):
            Circle(SKETCH30_R)
        with Locations((8.5, 70.5)):
            Circle(SKETCH30_R)
    extrude(amount=-CUT_EXTRUDE20_DEPTH, mode=Mode.SUBTRACT)

    # Sketch31 → Cut-Extrude21 (cut)
    with BuildSketch(Plane.ZY.offset(-34.186917696)):
        Polygon((-7.345299462, 68.5), (-6.190598923, 70.5), (-7.345299462, 72.5), (-9.654700538, 72.5), (-10.809401077, 70.5), (-9.654700538, 68.5), align=None)
        Polygon((9.654700538, 68.5), (10.809401077, 70.5), (9.654700538, 72.5), (7.345299462, 72.5), (6.190598923, 70.5), (7.345299462, 68.5), align=None)
    extrude(amount=-CUT_EXTRUDE21_DEPTH, mode=Mode.SUBTRACT)

    # Sketch32 → Cut-Extrude22 (cut)
    with BuildSketch(Plane.ZY.offset(-34.186917696)):
        with Locations((0, 71.25)):
            Circle(SKETCH32_R)
    extrude(amount=-CUT_EXTRUDE22_DEPTH, mode=Mode.SUBTRACT)

    # Sketch33 → Cut-Extrude23 (cut)
    with BuildSketch(Plane.ZY.offset(-39.186917696)):
        with Locations((0, 71.25)):
            Rectangle(SKETCH33_W, SKETCH33_H)
    extrude(amount=-CUT_EXTRUDE23_DEPTH, mode=Mode.SUBTRACT)

    # Sketch34 → Cut-Extrude24 (cut)
    with BuildSketch(Plane.ZY.offset(-34.186917696)):
        with Locations((0, 71.25)):
            Circle(SKETCH34_R)
    extrude(amount=-CUT_EXTRUDE24_DEPTH, mode=Mode.SUBTRACT)

    # Sketch35 → Cut-Extrude25 (cut)
    with BuildSketch(Plane.ZY.offset(-34.186917696)):
        with Locations((0, 66.75)):
            Circle(SKETCH35_R)
    extrude(amount=-CUT_EXTRUDE25_DEPTH, mode=Mode.SUBTRACT)


solid = part.part
